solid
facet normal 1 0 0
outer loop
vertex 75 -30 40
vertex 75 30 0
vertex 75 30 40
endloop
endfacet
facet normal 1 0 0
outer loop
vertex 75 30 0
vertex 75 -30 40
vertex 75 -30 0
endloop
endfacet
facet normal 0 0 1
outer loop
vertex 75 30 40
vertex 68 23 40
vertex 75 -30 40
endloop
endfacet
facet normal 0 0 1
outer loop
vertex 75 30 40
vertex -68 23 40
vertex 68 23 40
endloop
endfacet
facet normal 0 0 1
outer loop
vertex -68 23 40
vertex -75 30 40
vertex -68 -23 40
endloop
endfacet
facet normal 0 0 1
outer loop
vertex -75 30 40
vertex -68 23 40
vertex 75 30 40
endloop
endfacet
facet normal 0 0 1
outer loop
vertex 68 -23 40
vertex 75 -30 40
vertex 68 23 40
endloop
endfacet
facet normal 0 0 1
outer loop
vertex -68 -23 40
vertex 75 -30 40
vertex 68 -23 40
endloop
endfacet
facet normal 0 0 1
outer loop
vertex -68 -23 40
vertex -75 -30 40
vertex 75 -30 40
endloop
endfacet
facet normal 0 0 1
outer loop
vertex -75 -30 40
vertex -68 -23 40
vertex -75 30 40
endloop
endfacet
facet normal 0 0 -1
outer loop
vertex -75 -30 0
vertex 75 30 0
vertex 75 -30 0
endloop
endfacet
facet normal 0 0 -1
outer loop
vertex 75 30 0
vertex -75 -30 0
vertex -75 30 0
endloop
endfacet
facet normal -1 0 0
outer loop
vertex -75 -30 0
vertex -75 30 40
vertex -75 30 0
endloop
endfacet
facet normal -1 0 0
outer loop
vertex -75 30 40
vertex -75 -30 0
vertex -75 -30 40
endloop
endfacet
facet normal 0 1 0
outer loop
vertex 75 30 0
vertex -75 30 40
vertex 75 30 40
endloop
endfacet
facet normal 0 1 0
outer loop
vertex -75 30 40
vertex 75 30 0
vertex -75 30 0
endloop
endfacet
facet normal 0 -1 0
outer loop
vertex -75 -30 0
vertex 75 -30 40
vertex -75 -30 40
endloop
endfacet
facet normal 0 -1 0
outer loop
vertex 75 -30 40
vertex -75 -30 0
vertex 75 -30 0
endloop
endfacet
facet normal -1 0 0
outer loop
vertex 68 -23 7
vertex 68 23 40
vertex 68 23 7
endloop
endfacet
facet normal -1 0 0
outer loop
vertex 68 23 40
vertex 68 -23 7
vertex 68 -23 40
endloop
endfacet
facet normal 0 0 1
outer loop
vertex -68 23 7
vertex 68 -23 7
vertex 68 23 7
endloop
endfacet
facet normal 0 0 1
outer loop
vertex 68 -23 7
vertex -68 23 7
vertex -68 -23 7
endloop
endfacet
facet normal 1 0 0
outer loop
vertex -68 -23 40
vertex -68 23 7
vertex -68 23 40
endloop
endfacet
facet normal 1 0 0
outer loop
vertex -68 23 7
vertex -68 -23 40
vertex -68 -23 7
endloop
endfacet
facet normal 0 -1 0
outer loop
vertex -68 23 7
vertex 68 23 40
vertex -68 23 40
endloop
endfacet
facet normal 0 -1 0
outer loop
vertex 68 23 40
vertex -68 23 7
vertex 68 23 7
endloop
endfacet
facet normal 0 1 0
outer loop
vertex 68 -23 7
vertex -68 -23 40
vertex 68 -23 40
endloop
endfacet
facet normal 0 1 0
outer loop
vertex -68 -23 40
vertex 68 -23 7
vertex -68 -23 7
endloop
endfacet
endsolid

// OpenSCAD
birdhouse();

module birdhouse() {
  outer_width = 150;
  outer_depth = 60;
  outer_height = 40;
  thickness = (60-46)/2;
  
  inner_width = outer_width - 2 * thickness;
  inner_depth = outer_depth - 2 * thickness;
  inner_height = outer_height - thickness; // top is open
    
  difference() {
      // Outer box centered at width/depth
      translate([-outer_width/2,-outer_depth/2,0])
        cube([
        outer_width,
        outer_depth,
        outer_height
      ]);
      
      // Inner box
      // +10 to not make it literally same mm
      translate([-inner_width/2, -inner_depth/2, thickness])
        cube([inner_width, inner_depth, inner_height+10]);
  }
}
